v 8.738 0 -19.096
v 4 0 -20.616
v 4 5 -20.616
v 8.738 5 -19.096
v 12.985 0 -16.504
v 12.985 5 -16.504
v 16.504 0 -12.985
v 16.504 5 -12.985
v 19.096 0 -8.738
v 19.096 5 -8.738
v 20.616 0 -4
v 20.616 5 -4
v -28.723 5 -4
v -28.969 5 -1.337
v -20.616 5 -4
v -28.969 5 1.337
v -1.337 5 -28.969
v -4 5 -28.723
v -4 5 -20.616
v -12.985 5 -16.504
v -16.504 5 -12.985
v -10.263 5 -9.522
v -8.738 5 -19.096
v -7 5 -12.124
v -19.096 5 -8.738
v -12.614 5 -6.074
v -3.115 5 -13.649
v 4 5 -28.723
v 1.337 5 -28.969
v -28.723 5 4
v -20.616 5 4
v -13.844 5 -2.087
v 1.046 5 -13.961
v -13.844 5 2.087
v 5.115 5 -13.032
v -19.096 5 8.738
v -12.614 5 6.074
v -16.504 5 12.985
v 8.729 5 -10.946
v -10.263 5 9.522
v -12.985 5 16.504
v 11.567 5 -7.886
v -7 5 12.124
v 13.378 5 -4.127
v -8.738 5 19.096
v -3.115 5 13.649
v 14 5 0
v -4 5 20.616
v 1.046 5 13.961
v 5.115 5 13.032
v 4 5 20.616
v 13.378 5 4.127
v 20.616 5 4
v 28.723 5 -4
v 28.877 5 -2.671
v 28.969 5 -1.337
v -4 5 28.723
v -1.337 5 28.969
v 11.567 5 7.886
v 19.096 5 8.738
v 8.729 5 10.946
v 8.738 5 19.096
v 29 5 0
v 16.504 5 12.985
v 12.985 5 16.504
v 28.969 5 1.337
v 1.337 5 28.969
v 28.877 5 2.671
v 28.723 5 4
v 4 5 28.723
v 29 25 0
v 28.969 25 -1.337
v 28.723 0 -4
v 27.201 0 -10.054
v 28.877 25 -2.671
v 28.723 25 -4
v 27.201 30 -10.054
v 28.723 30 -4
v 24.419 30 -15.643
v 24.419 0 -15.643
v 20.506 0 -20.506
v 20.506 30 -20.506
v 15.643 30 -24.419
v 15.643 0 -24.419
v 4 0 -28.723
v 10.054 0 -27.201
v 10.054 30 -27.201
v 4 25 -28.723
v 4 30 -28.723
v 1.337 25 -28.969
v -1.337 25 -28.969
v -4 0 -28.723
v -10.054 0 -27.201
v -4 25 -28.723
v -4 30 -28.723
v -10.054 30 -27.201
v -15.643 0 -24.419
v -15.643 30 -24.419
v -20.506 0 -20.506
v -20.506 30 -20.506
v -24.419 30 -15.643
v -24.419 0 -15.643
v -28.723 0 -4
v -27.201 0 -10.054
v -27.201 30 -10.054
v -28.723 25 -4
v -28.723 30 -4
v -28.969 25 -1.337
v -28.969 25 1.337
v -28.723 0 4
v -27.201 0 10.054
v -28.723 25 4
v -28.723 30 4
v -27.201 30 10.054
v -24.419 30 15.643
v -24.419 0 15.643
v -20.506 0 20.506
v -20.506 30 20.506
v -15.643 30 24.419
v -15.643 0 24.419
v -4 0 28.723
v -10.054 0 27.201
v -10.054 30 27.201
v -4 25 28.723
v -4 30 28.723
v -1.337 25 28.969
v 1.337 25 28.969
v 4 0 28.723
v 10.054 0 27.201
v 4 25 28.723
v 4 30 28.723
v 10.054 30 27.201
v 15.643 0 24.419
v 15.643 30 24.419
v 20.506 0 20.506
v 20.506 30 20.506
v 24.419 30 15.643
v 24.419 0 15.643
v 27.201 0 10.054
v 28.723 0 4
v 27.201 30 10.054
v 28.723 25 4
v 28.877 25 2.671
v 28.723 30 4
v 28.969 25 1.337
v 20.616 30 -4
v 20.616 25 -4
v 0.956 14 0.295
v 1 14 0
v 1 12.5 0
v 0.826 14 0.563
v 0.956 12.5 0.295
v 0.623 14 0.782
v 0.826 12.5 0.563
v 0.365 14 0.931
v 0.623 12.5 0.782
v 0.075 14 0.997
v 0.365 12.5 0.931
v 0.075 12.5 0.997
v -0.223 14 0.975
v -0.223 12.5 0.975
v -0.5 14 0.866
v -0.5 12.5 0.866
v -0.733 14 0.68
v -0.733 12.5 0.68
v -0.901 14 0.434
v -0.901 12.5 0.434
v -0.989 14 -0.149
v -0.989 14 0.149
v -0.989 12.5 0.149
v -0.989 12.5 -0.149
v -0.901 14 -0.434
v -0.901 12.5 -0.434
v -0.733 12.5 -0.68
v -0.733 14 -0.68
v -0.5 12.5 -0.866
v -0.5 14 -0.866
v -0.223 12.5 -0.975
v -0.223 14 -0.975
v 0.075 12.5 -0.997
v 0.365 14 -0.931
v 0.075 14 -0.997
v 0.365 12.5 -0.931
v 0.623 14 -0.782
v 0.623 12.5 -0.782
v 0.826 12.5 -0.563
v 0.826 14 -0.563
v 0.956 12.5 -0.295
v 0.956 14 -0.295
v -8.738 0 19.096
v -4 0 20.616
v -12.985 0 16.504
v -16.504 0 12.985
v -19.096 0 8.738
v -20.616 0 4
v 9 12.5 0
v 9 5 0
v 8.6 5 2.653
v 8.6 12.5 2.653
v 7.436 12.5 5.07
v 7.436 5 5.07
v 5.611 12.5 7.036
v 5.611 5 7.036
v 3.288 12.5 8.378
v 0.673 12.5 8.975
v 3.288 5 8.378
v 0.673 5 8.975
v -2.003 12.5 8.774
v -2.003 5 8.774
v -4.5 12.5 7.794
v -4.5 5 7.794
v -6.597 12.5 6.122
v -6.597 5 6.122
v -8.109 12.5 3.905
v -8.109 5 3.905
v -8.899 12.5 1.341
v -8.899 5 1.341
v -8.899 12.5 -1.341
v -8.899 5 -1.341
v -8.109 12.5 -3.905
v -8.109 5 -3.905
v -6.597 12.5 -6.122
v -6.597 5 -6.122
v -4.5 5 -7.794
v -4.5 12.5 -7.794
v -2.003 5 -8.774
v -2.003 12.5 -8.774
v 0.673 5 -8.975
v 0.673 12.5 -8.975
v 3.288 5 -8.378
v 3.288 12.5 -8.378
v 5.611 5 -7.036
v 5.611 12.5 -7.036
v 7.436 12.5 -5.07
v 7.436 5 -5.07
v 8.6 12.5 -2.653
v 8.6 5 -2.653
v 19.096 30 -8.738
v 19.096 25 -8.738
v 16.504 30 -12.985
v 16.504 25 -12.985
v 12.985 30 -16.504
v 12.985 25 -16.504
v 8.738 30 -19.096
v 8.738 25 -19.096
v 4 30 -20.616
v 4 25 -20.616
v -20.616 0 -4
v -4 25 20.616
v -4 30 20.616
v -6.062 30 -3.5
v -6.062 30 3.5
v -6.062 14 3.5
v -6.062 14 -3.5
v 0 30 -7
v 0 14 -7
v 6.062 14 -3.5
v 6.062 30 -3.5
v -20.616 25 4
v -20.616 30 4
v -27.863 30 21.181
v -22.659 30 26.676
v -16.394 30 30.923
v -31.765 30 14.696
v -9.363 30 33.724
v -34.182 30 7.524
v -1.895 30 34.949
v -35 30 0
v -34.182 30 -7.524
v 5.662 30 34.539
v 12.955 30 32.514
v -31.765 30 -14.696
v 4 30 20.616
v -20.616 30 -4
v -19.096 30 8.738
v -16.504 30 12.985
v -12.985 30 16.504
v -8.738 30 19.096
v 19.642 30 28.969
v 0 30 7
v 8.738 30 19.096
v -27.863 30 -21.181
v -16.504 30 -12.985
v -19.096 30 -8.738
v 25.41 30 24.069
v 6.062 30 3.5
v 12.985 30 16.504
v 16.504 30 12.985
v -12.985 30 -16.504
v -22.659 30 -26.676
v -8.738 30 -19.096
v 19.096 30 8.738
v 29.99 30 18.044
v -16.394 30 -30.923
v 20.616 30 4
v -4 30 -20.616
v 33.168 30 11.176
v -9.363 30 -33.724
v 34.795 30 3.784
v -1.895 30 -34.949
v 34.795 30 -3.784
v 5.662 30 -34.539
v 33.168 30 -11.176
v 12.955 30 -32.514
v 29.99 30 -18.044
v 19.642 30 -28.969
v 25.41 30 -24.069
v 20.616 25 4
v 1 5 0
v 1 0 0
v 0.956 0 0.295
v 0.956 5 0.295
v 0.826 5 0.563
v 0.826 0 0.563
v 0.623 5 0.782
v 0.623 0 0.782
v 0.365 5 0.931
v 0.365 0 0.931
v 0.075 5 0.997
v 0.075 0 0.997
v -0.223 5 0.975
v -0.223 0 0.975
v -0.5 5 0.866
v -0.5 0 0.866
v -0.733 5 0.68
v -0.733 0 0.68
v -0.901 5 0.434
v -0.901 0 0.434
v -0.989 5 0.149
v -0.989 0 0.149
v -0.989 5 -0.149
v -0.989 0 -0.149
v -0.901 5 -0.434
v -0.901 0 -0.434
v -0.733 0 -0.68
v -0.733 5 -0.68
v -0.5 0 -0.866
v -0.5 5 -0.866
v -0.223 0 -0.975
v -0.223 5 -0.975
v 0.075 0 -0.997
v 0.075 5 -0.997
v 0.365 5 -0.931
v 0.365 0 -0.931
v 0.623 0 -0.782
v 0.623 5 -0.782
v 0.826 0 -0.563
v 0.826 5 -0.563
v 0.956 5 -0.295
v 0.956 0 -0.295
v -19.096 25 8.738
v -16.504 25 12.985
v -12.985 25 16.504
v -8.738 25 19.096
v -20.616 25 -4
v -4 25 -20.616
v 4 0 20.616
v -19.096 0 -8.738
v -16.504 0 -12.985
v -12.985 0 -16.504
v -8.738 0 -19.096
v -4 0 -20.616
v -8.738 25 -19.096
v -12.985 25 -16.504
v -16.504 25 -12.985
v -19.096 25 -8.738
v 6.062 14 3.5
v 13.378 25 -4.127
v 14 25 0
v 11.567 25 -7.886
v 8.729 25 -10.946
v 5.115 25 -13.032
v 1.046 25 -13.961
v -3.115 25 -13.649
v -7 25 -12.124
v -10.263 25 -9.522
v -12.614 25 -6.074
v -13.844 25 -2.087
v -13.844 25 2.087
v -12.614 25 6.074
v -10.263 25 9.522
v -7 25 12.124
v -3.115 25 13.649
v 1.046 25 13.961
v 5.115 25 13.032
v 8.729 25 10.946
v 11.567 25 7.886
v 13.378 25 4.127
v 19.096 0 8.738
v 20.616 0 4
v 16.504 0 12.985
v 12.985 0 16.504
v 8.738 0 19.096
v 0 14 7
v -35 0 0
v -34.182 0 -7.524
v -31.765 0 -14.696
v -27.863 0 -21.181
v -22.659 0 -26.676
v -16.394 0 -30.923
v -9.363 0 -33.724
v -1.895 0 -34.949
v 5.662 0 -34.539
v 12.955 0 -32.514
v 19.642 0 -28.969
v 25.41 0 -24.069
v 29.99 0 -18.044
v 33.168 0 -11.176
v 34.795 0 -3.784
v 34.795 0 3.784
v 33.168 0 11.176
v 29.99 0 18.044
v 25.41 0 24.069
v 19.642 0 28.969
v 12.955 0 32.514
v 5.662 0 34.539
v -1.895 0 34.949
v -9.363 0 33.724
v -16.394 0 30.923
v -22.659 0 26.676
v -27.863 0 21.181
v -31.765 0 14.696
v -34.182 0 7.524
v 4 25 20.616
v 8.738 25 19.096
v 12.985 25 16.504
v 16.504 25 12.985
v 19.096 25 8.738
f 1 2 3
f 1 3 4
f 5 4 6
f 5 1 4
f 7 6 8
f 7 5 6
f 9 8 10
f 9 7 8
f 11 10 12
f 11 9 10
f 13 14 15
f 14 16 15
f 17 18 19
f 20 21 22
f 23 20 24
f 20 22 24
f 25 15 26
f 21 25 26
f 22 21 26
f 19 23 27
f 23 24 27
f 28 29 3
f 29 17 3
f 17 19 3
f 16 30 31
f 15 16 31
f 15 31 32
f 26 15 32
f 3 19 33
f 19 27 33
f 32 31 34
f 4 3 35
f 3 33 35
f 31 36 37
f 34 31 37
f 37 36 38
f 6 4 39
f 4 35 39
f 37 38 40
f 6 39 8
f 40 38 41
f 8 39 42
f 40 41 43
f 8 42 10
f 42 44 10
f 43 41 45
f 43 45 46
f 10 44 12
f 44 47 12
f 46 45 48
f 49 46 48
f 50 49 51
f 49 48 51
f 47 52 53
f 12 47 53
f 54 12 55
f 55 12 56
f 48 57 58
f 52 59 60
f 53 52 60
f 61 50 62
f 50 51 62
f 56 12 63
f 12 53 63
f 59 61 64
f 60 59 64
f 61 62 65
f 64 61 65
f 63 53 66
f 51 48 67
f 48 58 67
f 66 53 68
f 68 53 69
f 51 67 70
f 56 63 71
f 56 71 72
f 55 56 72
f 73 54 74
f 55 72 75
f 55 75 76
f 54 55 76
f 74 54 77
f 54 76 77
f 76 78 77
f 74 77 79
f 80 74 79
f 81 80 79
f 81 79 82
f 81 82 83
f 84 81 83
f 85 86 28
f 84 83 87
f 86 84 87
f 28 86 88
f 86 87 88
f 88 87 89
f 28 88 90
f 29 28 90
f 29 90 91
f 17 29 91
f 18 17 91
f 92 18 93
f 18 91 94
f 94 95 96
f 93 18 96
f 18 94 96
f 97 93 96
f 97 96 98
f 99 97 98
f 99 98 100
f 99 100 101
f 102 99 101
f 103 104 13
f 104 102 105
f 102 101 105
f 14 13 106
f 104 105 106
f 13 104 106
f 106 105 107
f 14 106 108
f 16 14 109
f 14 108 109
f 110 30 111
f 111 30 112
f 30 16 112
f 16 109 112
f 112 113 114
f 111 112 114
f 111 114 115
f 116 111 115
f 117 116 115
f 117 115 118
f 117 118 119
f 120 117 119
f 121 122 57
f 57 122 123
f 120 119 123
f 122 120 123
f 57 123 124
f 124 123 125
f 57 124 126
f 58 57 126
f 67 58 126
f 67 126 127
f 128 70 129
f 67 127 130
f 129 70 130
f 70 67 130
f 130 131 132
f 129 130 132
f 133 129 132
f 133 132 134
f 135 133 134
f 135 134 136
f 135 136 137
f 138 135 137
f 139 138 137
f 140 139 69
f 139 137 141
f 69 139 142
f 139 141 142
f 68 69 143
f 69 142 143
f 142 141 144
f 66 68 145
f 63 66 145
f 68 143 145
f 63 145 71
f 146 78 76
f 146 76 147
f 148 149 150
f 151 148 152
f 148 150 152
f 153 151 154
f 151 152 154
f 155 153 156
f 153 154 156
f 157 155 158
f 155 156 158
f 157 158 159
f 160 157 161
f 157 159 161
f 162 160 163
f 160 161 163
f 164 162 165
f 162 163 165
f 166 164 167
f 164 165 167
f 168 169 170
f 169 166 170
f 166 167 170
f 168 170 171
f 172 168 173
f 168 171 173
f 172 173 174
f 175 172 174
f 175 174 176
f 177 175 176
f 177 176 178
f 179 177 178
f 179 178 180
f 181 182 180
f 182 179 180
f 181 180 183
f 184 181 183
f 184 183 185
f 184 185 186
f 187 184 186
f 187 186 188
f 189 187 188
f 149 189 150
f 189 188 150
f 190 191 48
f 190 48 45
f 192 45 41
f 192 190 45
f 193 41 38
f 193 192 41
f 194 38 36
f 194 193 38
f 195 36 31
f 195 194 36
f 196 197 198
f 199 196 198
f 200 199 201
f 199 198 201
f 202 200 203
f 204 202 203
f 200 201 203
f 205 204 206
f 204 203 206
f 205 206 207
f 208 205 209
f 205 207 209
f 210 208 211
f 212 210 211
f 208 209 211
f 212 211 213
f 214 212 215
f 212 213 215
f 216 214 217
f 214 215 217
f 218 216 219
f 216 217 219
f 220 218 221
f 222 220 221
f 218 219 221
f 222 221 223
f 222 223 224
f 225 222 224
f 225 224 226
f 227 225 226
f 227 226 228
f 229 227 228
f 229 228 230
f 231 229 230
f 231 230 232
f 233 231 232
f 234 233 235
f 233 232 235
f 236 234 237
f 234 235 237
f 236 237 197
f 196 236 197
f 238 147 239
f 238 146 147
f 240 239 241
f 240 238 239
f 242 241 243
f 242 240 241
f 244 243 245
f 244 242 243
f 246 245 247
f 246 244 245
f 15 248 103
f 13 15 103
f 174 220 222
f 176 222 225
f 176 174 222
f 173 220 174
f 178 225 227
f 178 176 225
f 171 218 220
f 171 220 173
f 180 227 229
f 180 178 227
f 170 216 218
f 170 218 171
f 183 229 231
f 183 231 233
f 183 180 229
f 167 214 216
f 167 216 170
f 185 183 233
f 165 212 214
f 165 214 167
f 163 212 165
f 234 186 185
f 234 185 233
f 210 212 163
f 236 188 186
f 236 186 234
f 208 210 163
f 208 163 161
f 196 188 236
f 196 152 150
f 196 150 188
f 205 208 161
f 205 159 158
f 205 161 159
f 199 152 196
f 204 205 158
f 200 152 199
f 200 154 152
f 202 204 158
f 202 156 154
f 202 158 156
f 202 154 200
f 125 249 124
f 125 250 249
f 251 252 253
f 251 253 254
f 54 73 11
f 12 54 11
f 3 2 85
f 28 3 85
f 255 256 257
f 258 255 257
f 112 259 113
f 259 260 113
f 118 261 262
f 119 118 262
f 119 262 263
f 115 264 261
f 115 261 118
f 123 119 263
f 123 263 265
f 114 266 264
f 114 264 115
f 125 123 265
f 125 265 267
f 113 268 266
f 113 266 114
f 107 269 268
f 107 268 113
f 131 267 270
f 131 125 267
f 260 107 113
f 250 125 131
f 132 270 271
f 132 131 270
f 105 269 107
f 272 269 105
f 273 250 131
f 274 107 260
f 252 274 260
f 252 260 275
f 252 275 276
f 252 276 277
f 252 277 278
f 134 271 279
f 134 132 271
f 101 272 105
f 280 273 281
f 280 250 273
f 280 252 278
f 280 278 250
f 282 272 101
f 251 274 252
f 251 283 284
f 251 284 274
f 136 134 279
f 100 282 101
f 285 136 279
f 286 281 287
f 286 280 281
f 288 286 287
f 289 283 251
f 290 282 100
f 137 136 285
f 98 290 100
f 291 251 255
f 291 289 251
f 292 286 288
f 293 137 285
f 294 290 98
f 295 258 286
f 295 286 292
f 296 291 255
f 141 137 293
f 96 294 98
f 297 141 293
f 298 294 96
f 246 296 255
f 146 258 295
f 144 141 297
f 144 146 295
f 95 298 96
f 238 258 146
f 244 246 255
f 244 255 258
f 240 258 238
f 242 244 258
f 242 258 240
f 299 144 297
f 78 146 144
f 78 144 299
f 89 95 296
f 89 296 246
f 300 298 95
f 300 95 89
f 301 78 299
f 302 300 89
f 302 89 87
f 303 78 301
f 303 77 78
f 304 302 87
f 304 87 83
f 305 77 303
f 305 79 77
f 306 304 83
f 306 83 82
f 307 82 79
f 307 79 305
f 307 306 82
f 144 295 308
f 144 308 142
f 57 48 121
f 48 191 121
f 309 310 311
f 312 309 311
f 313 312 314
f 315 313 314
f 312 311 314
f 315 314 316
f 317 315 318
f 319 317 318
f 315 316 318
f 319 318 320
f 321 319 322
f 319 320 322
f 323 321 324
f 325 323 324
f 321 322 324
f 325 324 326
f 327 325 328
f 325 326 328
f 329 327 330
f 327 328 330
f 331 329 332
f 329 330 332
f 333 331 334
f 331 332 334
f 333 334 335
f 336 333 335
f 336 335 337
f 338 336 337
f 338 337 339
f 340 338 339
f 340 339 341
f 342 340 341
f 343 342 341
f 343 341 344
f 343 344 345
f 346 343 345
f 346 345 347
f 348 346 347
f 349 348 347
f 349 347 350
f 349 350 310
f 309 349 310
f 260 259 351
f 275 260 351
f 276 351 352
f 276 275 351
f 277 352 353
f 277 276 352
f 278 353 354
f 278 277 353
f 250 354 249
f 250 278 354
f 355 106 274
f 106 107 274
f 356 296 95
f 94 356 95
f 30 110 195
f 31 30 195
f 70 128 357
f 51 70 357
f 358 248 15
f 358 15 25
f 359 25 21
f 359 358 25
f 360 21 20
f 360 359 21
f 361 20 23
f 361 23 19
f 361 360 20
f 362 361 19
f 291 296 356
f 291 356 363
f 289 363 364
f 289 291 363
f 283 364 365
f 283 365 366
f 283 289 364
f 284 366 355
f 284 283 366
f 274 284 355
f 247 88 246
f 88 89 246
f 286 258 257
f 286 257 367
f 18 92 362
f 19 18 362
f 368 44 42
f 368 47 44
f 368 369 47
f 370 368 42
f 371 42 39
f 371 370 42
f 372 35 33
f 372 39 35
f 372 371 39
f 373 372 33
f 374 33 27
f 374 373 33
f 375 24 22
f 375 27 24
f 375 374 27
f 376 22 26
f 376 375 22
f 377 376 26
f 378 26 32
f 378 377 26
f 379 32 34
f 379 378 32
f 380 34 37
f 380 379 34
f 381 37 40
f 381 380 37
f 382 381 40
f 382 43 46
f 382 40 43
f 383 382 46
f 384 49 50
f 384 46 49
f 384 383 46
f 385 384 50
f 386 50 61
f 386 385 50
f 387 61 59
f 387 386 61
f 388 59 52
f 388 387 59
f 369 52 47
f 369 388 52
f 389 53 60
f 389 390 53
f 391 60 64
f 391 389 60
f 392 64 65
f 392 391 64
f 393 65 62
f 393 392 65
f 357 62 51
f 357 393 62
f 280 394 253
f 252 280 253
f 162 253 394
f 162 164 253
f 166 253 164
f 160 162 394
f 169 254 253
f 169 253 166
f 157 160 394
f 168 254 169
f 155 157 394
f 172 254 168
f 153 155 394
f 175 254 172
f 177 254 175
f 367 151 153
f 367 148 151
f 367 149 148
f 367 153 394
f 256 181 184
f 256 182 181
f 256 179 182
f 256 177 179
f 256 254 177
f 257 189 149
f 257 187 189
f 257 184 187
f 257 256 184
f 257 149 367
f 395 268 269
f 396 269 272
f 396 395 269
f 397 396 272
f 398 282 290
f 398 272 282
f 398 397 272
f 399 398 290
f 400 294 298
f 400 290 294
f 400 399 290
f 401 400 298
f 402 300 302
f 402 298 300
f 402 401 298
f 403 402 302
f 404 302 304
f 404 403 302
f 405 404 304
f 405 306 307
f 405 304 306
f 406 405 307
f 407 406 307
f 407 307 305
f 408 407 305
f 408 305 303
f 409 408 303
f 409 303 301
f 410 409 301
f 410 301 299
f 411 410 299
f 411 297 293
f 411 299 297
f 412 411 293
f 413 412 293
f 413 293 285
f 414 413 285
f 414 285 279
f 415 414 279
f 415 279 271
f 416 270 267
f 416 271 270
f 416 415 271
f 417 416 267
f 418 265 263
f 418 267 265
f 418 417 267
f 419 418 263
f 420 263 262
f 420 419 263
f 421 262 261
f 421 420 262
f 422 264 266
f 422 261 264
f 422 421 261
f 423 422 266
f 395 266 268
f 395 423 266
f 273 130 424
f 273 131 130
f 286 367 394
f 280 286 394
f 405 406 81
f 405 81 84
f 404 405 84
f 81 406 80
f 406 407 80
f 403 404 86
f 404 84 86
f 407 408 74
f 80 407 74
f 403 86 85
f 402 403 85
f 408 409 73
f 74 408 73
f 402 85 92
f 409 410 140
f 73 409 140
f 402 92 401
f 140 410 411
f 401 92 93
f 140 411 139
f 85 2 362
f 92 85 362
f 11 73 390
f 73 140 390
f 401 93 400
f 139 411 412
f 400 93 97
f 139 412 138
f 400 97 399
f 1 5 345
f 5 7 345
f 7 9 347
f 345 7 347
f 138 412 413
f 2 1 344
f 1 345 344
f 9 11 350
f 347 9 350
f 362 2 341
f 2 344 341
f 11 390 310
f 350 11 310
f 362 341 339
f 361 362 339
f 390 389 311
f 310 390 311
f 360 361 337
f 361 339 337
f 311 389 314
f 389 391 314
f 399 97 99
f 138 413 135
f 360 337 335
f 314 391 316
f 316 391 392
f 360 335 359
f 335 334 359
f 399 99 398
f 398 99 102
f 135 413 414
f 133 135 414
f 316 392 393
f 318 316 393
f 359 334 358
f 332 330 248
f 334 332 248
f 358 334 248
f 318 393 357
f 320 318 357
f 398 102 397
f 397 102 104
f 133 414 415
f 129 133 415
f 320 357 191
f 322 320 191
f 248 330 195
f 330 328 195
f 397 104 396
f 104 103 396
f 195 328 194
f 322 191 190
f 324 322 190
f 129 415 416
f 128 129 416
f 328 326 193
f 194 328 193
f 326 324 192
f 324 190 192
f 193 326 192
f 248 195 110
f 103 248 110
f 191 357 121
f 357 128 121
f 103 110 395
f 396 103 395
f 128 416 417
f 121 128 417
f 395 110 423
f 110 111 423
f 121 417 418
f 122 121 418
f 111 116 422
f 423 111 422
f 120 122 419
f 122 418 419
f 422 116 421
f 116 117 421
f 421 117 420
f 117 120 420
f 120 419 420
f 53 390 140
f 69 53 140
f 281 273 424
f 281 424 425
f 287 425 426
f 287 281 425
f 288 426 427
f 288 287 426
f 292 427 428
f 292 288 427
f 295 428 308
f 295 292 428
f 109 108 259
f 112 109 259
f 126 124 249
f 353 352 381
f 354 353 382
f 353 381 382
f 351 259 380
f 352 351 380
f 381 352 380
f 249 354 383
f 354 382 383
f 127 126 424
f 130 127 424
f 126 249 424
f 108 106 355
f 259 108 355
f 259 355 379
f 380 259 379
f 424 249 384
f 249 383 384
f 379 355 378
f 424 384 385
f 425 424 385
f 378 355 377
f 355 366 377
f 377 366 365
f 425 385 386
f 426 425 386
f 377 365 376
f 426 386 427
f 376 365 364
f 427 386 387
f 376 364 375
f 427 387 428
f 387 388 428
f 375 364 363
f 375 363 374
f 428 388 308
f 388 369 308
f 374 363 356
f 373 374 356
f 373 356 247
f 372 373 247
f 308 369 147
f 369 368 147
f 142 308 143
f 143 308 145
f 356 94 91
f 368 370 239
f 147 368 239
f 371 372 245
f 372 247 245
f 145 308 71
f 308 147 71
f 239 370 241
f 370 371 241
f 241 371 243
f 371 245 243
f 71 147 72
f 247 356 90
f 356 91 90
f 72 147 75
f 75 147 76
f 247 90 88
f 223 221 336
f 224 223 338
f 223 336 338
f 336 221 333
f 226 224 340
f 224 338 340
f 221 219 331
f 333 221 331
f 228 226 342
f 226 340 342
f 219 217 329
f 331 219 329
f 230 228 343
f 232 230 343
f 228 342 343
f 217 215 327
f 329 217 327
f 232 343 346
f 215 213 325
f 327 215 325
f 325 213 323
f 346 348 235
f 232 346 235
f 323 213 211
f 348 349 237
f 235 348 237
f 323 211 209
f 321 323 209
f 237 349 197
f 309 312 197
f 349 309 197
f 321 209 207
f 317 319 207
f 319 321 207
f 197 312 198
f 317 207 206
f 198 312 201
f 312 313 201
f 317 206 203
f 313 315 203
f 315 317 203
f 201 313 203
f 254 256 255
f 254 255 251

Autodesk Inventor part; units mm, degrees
ref_plane "YZ Plane" through (0, 0, 0) normal (1, 0, 0) x (0, 1, 0)
ref_plane "XZ Plane" through (0, 0, 0) normal (0, 1, 0) x (-1, 0, 0)
ref_plane "XY Plane" through (0, 0, 0) normal (0, 0, 1) x (1, 0, 0)
sketch "Sketch1" plane through (0, 0, 0) normal (0, 1, 0) x (-1, 0, 0)
  circle A0 centre (0, 0) radius 35
  dimension "d0" = 70
extrude "Extrusion1" add sketch "Sketch1" along normal blind 30
sketch "Sketch2" plane through (0, 30, 0) normal (0, 1, 0) x (1, 0, 0)
  circle A0 centre (0, 0) radius 29
  dimension "d3" = 58
extrude "Extrusion2" cut sketch "Sketch2" against normal blind 30
sketch "Sketch3" plane through (0, 30, 0) normal (0, 1, 0) x (1, 0, 0)
  circle A0 centre (0, 0) radius 21
  dimension "d6" = 42
extrude "Extrusion3" add sketch "Sketch3" against normal blind 5
sketch "Sketch4" plane through (0, 25, 0) normal (0, -1, 0) x (1, 0, 0)
  circle A0 centre (0, 0) radius 14
  dimension "d9" = 28
extrude "Extrusion4" add sketch "Sketch4" along normal blind 20
sketch "Sketch5" plane through (0, 5, 0) normal (0, -1, 0) x (1, 0, 0)
  circle A0 centre (0, 0) radius 9
  dimension "d12" = 18
extrude "Extrusion5" cut sketch "Sketch5" against normal blind 20
sketch "Sketch6" plane through (0, 25, 0) normal (0, -1, 0) x (1, 0, 0)
  circle A0 centre (0, 0) radius 9
  dimension "d15" = 18
extrude "Extrusion6" add sketch "Sketch6" along normal blind 12.5
sketch "Sketch8" plane through (0, 12.5, 0) normal (0, -1, 0) x (1, 0, 0)
  circle A0 centre (0, 0) radius 1
  dimension "d26" = 2
extrude "Extrusion8" cut sketch "Sketch8" against normal blind 17.5
sketch "Sketch9" plane through (0, 0, 0) normal (0, -1, 0) x (1, 0, 0)
  circle A0 centre (0, 0) radius 1 projected
  circle A1 centre (0, 0) radius 21
extrude "Extrusion9" add sketch "Sketch9" against normal blind 5
sketch "Sketch10" plane through (0, 30, 0) normal (0, 1, 0) x (1, 0, 0)
  line L0 (17.6248, 0) -> (17.6248, -4)
  line L1 (17.6248, -4) -> (30.6643, -4)
  line L2 (30.6643, -4) -> (30.6643, 4)
  line L3 (30.6643, 4) -> (17.6248, 4)
  line L4 (17.6248, 4) -> (17.6248, 0)
  point P0 (0, 0)
  dimension "d31" = 4
  dimension "d32" = 8
extrude "Extrusion10" add sketch "Sketch10" against normal blind 5
sketch "Sketch11" plane through (0, 30, 0) normal (0, 1, 0) x (1, 0, 0)
  line L0 (0, 30.8076) -> (4, 30.8076)
  line L1 (4, 30.8076) -> (4, 17.4815)
  line L2 (4, 17.4815) -> (-4, 17.4815)
  line L3 (-4, 17.4815) -> (-4, 30.8076)
  line L4 (-4, 30.8076) -> (0, 30.8076)
  point P0 (0, 0)
  dimension "d35" = 4
  dimension "d36" = 8
extrude "Extrusion11" add sketch "Sketch11" against normal blind 5
sketch "Sketch12" plane through (0, 25, 0) normal (0, -1, 0) x (1, 0, 0)
  point P0 (0, 0)
sketch "Sketch13" plane through (0, 30, 0) normal (0, 1, 0) x (1, 0, 0)
  line L0 (0, -17.9114) -> (-4, -17.9114)
  line L1 (-4, -17.9114) -> (-4, -31.0942)
  line L2 (-4, -31.0942) -> (4, -31.0942)
  line L3 (4, -31.0942) -> (4, -17.9114)
  line L4 (4, -17.9114) -> (0, -17.9114)
  point P0 (0, 0)
  dimension "d39" = 4
  dimension "d40" = 8
extrude "Extrusion12" add sketch "Sketch13" against normal blind 5
sketch "Sketch14" plane through (0, 30, 0) normal (0, 1, 0) x (1, 0, 0)
  line L0 (-30.521, 0) -> (-30.521, 4)
  line L1 (-30.521, 4) -> (-18.198, 4)
  line L2 (-18.198, 4) -> (-18.198, -4)
  line L3 (-18.198, -4) -> (-30.521, -4)
  line L4 (-30.521, -4) -> (-30.521, 0)
  point P0 (0, 0)
  dimension "d43" = 4
  dimension "d44" = 8
extrude "Extrusion13" add sketch "Sketch14" against normal blind 5
sketch "Sketch15" plane through (0, 0, 0) normal (0, -1, 0) x (1, 0, 0)
  line L0 (-31.0942, 0) -> (-31.0942, 4)
  line L1 (-31.0942, 4) -> (-17.9114, 4)
  line L2 (-17.9114, 4) -> (-17.9114, -4)
  line L3 (-17.9114, -4) -> (-31.0942, -4)
  line L4 (-31.0942, -4) -> (-31.0942, 0)
  point P0 (0, 0)
  dimension "d47" = 4
  dimension "d48" = 8
extrude "Extrusion14" add sketch "Sketch15" against normal blind 5
sketch "Sketch16" plane through (0, 0, 0) normal (0, -1, 0) x (1, 0, 0)
  line L0 (0, 31.5241) -> (4, 31.5241)
  line L1 (4, 31.5241) -> (4, 16.7651)
  line L2 (4, 16.7651) -> (-4, 16.7651)
  line L3 (-4, 16.7651) -> (-4, 31.5241)
  line L4 (-4, 31.5241) -> (0, 31.5241)
  point P0 (0, 0)
  dimension "d51" = 4
  dimension "d52" = 8
extrude "Extrusion15" add sketch "Sketch16" against normal blind 5
sketch "Sketch17" plane through (0, 0, 0) normal (0, -1, 0) x (1, 0, 0)
  line L0 (31.954, 0) -> (31.954, -4)
  line L1 (31.954, -4) -> (17.6248, -4)
  line L2 (17.6248, -4) -> (17.6248, 4)
  line L3 (17.6248, 4) -> (31.954, 4)
  line L4 (31.954, 4) -> (31.954, 0)
  point P0 (0, 0)
  dimension "d55" = 4
  dimension "d56" = 8
extrude "Extrusion16" add sketch "Sketch17" against normal blind 5
sketch "Sketch18" plane through (0, 0, 0) normal (0, -1, 0) x (1, 0, 0)
  line L0 (0, -31.3808) -> (-4, -31.3808)
  line L1 (-4, -31.3808) -> (-4, -18.3413)
  line L2 (-4, -18.3413) -> (4, -18.3413)
  line L3 (4, -18.3413) -> (4, -31.3808)
  line L4 (4, -31.3808) -> (0, -31.3808)
  point P0 (0, 0)
  dimension "d59" = 4
  dimension "d60" = 8
extrude "Extrusion17" add sketch "Sketch18" against normal blind 5
sketch "Sketch19" plane through (0, 30, 0) normal (0, 1, 0) x (1, 0, 0)
  circle A0 centre (0, 0) radius 1 projected
  line L0 (0, 7) -> (6.0622, 3.5)
  line L1 (6.0622, 3.5) -> (6.0622, -3.5)
  line L2 (6.0622, -3.5) -> (0, -7)
  line L3 (0, -7) -> (-6.0622, -3.5)
  line L4 (-6.0622, -3.5) -> (-6.0622, 3.5)
  line L5 (0, 7) -> (-6.0622, 3.5)
  dimension "d64" = 7
  dimension "d65" = 7
extrude "Extrusion18" cut sketch "Sketch19" against normal blind 16
properties part number "Wheel_2.0"
